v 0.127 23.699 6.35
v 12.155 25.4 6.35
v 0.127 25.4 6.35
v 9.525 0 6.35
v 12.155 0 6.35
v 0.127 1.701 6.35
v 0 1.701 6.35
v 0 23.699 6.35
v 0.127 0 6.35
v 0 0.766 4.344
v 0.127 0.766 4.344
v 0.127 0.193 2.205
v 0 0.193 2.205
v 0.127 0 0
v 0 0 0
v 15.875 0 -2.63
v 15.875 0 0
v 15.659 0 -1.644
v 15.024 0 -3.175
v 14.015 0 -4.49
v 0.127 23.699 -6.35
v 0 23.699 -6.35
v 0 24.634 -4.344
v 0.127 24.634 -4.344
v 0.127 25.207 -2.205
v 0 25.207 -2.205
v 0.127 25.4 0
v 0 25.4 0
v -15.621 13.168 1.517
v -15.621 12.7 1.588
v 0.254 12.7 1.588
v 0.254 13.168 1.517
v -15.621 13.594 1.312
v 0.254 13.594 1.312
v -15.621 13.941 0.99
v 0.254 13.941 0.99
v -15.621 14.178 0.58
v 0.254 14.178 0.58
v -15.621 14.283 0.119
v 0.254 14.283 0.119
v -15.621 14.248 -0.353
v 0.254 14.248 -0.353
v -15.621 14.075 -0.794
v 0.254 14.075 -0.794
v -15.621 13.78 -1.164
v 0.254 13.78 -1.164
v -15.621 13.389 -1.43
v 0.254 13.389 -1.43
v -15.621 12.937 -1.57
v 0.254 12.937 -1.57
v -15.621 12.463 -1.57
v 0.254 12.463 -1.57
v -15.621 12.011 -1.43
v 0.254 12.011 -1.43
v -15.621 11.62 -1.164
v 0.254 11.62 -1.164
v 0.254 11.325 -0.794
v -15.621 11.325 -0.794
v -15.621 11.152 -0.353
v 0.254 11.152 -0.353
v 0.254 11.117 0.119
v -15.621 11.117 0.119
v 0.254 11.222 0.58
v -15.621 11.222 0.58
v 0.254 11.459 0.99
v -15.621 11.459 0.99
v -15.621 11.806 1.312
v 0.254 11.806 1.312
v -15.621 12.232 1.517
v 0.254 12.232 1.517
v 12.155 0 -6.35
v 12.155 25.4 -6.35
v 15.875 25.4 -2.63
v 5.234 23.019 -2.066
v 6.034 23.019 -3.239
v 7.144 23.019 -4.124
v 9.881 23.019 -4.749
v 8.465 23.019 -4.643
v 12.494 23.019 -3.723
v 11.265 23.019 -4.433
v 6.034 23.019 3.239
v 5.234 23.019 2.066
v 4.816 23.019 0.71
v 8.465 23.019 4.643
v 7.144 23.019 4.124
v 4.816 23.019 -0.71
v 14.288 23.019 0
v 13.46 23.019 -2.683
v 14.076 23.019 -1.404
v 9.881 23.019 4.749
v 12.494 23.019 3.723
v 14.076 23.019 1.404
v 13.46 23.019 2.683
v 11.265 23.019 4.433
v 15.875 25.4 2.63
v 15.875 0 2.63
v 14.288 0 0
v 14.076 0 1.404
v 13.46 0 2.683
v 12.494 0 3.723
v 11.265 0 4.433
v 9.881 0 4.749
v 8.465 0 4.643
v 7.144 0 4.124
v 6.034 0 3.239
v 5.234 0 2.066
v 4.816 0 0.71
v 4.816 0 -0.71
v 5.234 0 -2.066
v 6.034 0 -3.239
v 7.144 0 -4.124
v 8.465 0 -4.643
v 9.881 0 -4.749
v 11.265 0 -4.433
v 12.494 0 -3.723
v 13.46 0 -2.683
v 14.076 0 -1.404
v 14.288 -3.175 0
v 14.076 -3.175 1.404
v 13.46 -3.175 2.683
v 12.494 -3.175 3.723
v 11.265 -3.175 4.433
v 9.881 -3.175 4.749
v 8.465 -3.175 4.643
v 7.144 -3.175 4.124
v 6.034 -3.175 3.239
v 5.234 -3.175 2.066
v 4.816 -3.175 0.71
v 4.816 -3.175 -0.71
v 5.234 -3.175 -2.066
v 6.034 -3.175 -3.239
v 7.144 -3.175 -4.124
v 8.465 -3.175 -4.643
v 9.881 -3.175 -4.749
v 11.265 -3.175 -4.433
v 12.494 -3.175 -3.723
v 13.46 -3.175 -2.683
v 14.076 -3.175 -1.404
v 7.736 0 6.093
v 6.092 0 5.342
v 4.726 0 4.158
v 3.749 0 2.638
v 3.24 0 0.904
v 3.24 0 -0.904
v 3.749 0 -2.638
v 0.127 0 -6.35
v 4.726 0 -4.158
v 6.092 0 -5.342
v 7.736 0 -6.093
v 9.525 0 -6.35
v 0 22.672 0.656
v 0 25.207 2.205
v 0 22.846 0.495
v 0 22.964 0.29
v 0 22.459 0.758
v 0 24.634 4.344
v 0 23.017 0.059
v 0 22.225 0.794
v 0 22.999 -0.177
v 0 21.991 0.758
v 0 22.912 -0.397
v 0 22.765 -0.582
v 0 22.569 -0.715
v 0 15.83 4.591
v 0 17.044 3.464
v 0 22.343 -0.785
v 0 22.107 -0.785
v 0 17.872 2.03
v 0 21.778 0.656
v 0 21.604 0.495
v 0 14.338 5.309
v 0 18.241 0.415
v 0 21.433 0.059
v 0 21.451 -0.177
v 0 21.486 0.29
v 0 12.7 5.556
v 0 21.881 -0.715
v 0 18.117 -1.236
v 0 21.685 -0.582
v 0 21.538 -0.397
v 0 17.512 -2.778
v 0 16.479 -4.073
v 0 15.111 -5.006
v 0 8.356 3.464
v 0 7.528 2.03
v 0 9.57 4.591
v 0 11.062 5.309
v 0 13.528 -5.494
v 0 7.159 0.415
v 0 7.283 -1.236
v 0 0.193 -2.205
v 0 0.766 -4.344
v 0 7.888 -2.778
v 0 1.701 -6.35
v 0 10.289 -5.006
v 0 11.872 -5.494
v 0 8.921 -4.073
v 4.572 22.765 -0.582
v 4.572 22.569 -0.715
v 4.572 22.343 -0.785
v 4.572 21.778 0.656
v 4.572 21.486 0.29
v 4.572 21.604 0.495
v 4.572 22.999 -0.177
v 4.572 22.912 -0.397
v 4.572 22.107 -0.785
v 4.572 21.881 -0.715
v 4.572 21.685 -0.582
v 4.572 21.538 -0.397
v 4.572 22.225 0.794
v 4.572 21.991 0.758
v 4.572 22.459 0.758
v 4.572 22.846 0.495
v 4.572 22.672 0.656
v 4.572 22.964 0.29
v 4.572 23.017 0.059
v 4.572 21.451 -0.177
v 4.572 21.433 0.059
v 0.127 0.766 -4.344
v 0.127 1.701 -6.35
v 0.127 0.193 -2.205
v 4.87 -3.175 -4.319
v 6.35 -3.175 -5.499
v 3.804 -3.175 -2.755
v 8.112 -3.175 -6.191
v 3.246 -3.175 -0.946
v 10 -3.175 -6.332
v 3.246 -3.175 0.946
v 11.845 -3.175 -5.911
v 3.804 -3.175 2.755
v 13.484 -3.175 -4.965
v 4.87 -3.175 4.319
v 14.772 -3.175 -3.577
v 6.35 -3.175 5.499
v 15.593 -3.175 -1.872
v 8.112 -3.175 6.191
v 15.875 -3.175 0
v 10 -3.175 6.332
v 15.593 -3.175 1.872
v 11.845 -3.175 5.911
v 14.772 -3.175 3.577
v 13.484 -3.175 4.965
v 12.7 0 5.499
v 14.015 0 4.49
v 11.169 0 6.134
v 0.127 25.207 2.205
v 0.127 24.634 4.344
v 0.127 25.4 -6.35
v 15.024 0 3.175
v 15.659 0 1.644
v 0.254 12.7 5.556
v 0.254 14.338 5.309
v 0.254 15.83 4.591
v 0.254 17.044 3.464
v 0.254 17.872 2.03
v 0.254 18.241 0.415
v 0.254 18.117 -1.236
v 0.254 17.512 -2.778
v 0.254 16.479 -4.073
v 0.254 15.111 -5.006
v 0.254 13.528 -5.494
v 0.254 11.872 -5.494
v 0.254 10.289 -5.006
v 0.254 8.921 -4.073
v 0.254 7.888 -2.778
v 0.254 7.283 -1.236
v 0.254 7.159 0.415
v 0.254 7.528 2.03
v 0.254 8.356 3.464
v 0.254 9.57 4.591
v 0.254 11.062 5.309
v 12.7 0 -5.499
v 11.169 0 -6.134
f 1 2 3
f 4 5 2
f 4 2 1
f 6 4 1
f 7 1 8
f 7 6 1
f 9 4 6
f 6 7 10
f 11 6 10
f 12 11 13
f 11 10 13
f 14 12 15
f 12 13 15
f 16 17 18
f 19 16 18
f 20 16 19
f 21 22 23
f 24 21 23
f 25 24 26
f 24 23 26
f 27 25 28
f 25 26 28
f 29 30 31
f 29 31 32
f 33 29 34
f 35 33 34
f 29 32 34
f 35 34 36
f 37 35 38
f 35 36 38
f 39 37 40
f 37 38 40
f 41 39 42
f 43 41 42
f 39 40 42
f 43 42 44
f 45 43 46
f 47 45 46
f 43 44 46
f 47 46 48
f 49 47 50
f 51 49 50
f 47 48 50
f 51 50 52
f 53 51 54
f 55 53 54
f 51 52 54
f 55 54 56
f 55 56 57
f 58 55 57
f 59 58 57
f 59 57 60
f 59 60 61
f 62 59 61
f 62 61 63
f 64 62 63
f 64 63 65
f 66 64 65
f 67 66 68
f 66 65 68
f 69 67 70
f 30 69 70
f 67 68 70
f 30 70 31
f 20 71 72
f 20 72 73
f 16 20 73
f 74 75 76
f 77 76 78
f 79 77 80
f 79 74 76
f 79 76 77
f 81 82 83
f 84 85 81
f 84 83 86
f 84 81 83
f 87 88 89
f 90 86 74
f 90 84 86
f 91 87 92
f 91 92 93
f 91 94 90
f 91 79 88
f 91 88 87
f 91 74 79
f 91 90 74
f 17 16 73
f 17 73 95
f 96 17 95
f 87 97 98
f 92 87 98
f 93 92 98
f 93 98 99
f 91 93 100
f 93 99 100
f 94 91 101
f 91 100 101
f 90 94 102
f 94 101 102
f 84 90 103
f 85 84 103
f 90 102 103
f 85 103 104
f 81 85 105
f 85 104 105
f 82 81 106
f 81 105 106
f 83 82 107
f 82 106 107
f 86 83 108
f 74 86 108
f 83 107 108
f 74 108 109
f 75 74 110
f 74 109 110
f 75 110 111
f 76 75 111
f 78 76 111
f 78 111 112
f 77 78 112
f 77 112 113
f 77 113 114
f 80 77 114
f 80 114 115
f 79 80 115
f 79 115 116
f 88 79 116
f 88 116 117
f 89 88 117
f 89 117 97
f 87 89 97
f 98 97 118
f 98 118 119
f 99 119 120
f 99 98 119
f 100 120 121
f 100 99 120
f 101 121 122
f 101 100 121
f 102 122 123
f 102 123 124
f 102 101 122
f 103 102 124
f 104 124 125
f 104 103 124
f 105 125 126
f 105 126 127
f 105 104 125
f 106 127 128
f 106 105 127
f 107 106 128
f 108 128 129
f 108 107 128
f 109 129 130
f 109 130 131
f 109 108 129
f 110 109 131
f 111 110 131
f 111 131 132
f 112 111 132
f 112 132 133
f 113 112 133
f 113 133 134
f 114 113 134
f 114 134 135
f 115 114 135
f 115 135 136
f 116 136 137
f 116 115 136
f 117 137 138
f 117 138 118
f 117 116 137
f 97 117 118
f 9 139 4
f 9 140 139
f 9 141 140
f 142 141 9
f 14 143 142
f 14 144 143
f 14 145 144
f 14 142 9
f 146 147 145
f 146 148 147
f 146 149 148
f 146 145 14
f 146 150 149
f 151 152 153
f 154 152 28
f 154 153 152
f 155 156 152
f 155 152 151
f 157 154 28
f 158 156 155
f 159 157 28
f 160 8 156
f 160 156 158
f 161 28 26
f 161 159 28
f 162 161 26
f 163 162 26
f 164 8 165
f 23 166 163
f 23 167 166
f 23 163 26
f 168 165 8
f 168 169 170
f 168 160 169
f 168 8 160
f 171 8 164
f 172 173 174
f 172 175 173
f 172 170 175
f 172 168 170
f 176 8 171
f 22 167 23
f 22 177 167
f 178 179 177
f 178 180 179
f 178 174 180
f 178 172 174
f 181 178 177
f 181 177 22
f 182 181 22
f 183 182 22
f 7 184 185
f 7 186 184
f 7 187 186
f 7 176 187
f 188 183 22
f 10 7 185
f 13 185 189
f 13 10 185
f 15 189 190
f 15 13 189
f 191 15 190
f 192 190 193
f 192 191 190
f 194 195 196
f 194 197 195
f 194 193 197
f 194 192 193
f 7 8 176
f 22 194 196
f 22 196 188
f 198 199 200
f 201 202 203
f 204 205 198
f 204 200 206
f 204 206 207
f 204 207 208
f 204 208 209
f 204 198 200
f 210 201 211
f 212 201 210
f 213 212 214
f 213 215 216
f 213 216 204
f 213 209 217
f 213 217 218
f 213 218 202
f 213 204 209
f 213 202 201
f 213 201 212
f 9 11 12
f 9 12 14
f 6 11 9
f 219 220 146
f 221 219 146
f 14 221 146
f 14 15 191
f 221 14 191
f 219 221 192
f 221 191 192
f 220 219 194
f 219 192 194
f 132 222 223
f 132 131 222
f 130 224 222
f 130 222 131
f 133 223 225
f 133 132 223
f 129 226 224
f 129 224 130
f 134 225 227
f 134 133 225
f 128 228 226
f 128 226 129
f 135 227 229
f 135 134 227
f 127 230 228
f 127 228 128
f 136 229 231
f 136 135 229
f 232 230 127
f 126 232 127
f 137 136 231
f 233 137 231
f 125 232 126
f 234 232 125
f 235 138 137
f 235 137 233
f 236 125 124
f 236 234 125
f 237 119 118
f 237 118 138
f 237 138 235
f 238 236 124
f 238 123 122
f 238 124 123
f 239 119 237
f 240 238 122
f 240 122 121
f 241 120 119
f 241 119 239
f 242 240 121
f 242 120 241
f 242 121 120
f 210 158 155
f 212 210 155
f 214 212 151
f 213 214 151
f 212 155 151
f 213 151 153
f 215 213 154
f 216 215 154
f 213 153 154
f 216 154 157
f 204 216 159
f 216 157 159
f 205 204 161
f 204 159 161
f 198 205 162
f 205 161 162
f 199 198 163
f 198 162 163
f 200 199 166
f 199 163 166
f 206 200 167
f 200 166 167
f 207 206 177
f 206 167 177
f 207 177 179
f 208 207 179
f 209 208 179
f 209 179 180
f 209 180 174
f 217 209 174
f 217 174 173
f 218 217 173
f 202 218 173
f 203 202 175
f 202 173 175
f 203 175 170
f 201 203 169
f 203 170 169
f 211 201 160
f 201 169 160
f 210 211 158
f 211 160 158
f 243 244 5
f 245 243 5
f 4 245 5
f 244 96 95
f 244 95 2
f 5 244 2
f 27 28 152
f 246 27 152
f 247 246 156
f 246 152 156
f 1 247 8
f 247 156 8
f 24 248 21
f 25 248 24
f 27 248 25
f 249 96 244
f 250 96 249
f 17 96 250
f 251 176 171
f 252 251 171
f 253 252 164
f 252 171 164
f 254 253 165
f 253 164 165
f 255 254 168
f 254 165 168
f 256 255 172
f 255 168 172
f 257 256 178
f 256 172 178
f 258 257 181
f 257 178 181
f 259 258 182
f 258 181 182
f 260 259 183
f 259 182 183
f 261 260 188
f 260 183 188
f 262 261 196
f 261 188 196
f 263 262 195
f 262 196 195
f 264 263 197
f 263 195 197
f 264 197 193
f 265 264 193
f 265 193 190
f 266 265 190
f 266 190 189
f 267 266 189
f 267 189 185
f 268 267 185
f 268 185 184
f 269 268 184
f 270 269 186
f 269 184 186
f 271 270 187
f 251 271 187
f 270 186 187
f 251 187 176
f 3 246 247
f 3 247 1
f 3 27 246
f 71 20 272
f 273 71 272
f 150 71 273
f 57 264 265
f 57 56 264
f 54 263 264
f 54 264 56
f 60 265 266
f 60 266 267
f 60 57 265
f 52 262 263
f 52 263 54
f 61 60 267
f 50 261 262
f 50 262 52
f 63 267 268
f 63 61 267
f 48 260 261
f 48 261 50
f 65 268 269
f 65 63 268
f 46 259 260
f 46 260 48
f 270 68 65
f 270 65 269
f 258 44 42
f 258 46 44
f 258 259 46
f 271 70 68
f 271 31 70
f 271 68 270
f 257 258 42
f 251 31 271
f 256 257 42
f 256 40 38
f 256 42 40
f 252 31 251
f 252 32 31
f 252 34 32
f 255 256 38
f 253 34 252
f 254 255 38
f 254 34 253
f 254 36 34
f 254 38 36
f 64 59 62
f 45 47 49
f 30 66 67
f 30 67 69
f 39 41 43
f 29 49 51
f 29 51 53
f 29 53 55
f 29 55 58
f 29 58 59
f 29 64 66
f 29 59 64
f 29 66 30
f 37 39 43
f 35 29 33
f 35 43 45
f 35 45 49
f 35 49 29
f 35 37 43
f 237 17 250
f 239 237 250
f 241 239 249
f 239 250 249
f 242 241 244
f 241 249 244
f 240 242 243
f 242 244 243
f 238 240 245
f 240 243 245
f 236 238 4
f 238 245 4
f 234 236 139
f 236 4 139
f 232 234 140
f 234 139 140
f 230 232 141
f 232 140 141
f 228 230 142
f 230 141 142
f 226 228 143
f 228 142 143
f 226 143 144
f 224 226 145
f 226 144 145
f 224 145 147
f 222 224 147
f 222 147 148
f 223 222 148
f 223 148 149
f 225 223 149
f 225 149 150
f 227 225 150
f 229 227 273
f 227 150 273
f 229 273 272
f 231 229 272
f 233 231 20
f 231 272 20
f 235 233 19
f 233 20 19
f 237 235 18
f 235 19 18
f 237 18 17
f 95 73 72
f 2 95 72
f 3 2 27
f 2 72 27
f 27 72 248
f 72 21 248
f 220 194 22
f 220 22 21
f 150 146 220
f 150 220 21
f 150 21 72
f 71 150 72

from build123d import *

# Parameters (mm, degrees)
BOSS_EXTRUDE1_DEPTH = 25.4
SKETCH2_R           = 6.35
SKETCH2_R_2         = 4.7625
BOSS_EXTRUDE2_DEPTH = 3.175
SKETCH3_R           = 4.7625
CUT_EXTRUDE1_DEPTH  = 26.19375
SKETCH4_R           = 5.55625
CUT_EXTRUDE2_DEPTH  = 0.254
SKETCH5_R           = 1.5875
BOSS_EXTRUDE3_DEPTH = 15.875
SKETCH6_R           = 0.79375
CUT_EXTRUDE3_DEPTH  = 4.572
CUT_EXTRUDE4_DEPTH  = 0.127


with BuildPart() as part:
    # Sketch1 → Boss-Extrude1 (new body)
    with BuildSketch(Plane(origin=(0, 0, 0), x_dir=(1, 0, 0), z_dir=(0, 1, 0))):
        Polygon((0, -6.35), (0, 6.35), (12.155256121, 6.35), (15.875, 2.630256121), (15.875, -2.630256121), (12.155256121, -6.35), align=None)
    extrude(amount=BOSS_EXTRUDE1_DEPTH)

    # Sketch2 → Boss-Extrude2 (add)
    with BuildSketch(Plane.XZ):
        with Locations((9.525, 0)):
            Circle(SKETCH2_R)
        with Locations((9.525, 0)):
            Circle(SKETCH2_R_2, mode=Mode.SUBTRACT)
    extrude(amount=BOSS_EXTRUDE2_DEPTH)

    # Sketch3 → Cut-Extrude1 (cut)
    with BuildSketch(Plane.XZ.offset(3.175)):
        with Locations((9.525, 0)):
            Circle(SKETCH3_R)
    extrude(amount=-CUT_EXTRUDE1_DEPTH, mode=Mode.SUBTRACT)

    # Sketch4 → Cut-Extrude2 (cut)
    with BuildSketch(Plane.ZY):
        with Locations((0, 12.7)):
            Circle(SKETCH4_R)
    extrude(amount=-CUT_EXTRUDE2_DEPTH, mode=Mode.SUBTRACT)

    # Sketch5 → Boss-Extrude3 (add)
    with BuildSketch(Plane.ZY.offset(-0.254)):
        with Locations((0, 12.7)):
            Circle(SKETCH5_R)
    extrude(amount=BOSS_EXTRUDE3_DEPTH)

    # Sketch6 → Cut-Extrude3 (cut)
    with BuildSketch(Plane.ZY):
        with Locations((0, 22.225)):
            Circle(SKETCH6_R)
    extrude(amount=-CUT_EXTRUDE3_DEPTH, mode=Mode.SUBTRACT)

    # Sketch7 → Cut-Extrude4 (cut)
    with BuildSketch(Plane.ZY):
        with BuildLine():
            ThreePointArc((0, 25.4), (3.287001873, 24.967257994), (6.35, 23.698522628))
            Line((6.35, 23.698522628), (6.35, 25.4))
            Line((6.35, 25.4), (0, 25.4))
        make_face()
        with BuildLine():
            Line((-6.35, 25.4), (-6.35, 23.698522628))
            ThreePointArc((-6.35, 23.698522628), (-3.287001873, 24.967257994), (0, 25.4))
            Line((0, 25.4), (-6.35, 25.4))
        make_face()
        with BuildLine():
            Line((-6.35, 1.701477372), (-6.35, 0))
            Line((-6.35, 0), (0, 0))
            ThreePointArc((0, 0), (-3.287001873, 0.432742006), (-6.35, 1.701477372))
        make_face()
        with BuildLine():
            ThreePointArc((6.35, 1.701477372), (3.287001873, 0.432742006), (0, 0))
            Line((0, 0), (6.35, 0))
            Line((6.35, 0), (6.35, 1.701477372))
        make_face()
    extrude(amount=-CUT_EXTRUDE4_DEPTH, mode=Mode.SUBTRACT)


solid = part.part
